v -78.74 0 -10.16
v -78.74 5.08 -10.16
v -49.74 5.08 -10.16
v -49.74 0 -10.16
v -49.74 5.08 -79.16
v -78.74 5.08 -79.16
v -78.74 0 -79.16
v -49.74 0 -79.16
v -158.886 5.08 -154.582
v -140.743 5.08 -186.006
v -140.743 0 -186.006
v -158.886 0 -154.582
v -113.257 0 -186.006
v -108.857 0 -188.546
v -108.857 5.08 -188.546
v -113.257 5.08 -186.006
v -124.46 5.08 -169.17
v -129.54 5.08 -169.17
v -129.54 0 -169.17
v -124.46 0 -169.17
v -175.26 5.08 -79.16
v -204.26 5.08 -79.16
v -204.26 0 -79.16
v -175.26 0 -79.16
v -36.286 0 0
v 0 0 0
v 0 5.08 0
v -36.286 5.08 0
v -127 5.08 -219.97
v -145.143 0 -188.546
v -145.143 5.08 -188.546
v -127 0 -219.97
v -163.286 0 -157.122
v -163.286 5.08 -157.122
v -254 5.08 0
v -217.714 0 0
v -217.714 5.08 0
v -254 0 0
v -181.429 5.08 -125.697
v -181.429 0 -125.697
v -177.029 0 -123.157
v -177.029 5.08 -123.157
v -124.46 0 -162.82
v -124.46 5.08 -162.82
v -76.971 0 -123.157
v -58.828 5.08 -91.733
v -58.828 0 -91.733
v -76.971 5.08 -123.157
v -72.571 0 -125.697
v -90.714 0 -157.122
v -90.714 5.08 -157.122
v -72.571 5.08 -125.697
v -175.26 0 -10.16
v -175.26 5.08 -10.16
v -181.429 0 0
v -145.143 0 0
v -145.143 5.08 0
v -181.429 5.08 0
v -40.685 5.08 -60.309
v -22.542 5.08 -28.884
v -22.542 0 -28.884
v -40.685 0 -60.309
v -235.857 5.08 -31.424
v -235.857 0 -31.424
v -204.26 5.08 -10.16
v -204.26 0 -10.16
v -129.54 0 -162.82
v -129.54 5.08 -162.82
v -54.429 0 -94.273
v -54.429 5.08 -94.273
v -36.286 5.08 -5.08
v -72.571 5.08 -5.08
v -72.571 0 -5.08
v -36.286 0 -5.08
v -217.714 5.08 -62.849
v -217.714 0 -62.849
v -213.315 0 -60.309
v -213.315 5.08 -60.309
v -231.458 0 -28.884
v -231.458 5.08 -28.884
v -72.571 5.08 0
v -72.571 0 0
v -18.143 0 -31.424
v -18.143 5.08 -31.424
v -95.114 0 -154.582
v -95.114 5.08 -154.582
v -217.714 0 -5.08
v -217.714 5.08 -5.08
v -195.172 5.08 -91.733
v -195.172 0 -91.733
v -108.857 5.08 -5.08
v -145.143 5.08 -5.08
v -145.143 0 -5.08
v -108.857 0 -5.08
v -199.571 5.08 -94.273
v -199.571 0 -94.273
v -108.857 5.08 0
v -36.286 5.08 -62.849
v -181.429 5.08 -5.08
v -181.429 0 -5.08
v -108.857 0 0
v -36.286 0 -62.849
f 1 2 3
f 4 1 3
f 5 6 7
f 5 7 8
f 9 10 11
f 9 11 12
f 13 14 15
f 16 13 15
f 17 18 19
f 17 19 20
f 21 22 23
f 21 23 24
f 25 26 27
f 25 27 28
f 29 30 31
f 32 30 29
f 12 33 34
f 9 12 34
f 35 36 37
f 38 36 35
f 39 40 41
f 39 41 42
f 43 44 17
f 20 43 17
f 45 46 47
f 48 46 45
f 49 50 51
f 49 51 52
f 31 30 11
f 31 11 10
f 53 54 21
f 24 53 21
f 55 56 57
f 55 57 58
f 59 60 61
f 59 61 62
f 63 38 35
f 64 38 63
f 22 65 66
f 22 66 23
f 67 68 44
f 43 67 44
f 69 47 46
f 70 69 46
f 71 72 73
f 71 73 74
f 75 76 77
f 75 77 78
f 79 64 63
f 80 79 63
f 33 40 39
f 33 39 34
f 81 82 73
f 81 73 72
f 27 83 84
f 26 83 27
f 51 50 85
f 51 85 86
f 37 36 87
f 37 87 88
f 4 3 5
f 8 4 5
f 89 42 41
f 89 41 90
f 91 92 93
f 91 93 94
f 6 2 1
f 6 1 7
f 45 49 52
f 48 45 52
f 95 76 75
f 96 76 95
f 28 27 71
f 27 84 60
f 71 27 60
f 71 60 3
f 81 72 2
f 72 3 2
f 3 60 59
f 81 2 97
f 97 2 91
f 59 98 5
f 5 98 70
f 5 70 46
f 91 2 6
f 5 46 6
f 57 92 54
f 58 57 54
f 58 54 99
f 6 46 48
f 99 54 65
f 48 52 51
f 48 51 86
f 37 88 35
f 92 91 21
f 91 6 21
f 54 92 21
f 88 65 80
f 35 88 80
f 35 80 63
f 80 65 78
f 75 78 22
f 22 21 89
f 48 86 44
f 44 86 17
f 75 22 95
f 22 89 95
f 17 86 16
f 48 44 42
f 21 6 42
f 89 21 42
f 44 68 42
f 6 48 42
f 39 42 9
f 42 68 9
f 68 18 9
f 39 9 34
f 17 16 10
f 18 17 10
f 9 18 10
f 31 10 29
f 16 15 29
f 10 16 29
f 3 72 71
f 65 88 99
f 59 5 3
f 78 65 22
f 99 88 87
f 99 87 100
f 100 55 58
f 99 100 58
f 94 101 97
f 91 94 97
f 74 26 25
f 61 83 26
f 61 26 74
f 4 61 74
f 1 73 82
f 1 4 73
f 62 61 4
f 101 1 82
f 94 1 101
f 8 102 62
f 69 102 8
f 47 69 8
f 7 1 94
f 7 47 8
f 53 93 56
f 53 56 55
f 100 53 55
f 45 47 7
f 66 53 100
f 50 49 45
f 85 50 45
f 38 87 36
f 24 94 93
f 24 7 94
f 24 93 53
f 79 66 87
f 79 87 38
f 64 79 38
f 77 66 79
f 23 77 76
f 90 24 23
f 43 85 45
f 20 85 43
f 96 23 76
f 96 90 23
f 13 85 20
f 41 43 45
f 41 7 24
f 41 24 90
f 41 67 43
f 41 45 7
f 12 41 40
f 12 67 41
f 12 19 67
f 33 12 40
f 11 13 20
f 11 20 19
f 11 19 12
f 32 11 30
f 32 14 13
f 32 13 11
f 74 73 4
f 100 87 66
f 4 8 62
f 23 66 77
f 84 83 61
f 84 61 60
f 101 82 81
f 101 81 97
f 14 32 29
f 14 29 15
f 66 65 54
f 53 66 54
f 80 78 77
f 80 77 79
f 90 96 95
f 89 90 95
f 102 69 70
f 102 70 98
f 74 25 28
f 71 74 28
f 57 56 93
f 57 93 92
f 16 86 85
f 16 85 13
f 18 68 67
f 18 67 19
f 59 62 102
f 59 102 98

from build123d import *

# Parameters (mm, degrees)
BOSS_EXTRUDE1_DEPTH = 5.08
SKETCH4_W           = 29
SKETCH4_H           = 69
CUT_EXTRUDE1_DEPTH  = 5.08
SKETCH8_W           = 36.285714285
SKETCH8_H           = 5.08
SKETCH8_W_2         = 36.285714286
CUT_EXTRUDE2_DEPTH  = 5.08
SKETCH9_W           = 36.285714285
SKETCH9_H           = 5.08
SKETCH9_W_2         = 36.285714286
CUT_EXTRUDE3_DEPTH  = 5.08
SKETCH10_W          = 36.285714285
SKETCH10_H          = 5.08
SKETCH10_W_2        = 36.285714286
CUT_EXTRUDE4_DEPTH  = 5.08
SKETCH12_W          = 5.08
SKETCH12_H          = 6.35
CUT_EXTRUDE6_DEPTH  = 5.08


with BuildPart() as part:
    # Sketch1 → Boss-Extrude1 (new body)
    with BuildSketch(Plane(origin=(0, 0, 0), x_dir=(1, 0, 0), z_dir=(0, 1, 0))):
        Polygon((0, 0), (-254, 0), (-127, 219.970452561), align=None)
    extrude(amount=BOSS_EXTRUDE1_DEPTH)

    # Sketch4 → Cut-Extrude1 (cut)
    with BuildSketch(Plane(origin=(0, 5.08, 0), x_dir=(1, 0, 0), z_dir=(0, 1, 0))):
        with Locations((-189.76, 44.66)):
            Rectangle(SKETCH4_W, SKETCH4_H)
        with Locations((-64.24, 44.66)):
            Rectangle(SKETCH4_W, SKETCH4_H)
    extrude(amount=-CUT_EXTRUDE1_DEPTH, mode=Mode.SUBTRACT)

    # Sketch8 → Cut-Extrude2 (cut)
    with BuildSketch(Plane(origin=(-190.5, 0, -109.985226281), x_dir=(-0.5, 0, 0.866025404), z_dir=(-0.866025404, 0, -0.5))):
        with Locations((-72.571428572, 2.54)):
            Rectangle(SKETCH8_W, SKETCH8_H)
        with Locations((0, 2.54)):
            Rectangle(SKETCH8_W_2, SKETCH8_H)
        with Locations((72.571428572, 2.54)):
            Rectangle(SKETCH8_W, SKETCH8_H)
    extrude(amount=-CUT_EXTRUDE2_DEPTH, mode=Mode.SUBTRACT)

    # Sketch9 → Cut-Extrude3 (cut)
    with BuildSketch(Plane.XY):
        with Locations((-54.428571428, 2.54)):
            Rectangle(SKETCH9_W, SKETCH9_H)
        with Locations((-127, 2.54)):
            Rectangle(SKETCH9_W_2, SKETCH9_H)
        with Locations((-199.571428572, 2.54)):
            Rectangle(SKETCH9_W, SKETCH9_H)
    extrude(amount=-CUT_EXTRUDE3_DEPTH, mode=Mode.SUBTRACT)

    # Sketch10 → Cut-Extrude4 (cut)
    with BuildSketch(Plane(origin=(0, 0, 0), x_dir=(-0.5, 0, -0.866025404), z_dir=(0.866025404, 0, -0.5))):
        with Locations((54.428571428, 2.54)):
            Rectangle(SKETCH10_W, SKETCH10_H)
        with Locations((127, 2.54)):
            Rectangle(SKETCH10_W_2, SKETCH10_H)
        with Locations((199.571428572, 2.54)):
            Rectangle(SKETCH10_W, SKETCH10_H)
    extrude(amount=-CUT_EXTRUDE4_DEPTH, mode=Mode.SUBTRACT)

    # Sketch12 → Cut-Extrude6 (cut)
    with BuildSketch(Plane(origin=(0, 5.08, 0), x_dir=(1, 0, 0), z_dir=(0, 1, 0))):
        with Locations((-127, 165.995452561)):
            Rectangle(SKETCH12_W, SKETCH12_H)
    extrude(amount=-CUT_EXTRUDE6_DEPTH, mode=Mode.SUBTRACT)


solid = part.part
